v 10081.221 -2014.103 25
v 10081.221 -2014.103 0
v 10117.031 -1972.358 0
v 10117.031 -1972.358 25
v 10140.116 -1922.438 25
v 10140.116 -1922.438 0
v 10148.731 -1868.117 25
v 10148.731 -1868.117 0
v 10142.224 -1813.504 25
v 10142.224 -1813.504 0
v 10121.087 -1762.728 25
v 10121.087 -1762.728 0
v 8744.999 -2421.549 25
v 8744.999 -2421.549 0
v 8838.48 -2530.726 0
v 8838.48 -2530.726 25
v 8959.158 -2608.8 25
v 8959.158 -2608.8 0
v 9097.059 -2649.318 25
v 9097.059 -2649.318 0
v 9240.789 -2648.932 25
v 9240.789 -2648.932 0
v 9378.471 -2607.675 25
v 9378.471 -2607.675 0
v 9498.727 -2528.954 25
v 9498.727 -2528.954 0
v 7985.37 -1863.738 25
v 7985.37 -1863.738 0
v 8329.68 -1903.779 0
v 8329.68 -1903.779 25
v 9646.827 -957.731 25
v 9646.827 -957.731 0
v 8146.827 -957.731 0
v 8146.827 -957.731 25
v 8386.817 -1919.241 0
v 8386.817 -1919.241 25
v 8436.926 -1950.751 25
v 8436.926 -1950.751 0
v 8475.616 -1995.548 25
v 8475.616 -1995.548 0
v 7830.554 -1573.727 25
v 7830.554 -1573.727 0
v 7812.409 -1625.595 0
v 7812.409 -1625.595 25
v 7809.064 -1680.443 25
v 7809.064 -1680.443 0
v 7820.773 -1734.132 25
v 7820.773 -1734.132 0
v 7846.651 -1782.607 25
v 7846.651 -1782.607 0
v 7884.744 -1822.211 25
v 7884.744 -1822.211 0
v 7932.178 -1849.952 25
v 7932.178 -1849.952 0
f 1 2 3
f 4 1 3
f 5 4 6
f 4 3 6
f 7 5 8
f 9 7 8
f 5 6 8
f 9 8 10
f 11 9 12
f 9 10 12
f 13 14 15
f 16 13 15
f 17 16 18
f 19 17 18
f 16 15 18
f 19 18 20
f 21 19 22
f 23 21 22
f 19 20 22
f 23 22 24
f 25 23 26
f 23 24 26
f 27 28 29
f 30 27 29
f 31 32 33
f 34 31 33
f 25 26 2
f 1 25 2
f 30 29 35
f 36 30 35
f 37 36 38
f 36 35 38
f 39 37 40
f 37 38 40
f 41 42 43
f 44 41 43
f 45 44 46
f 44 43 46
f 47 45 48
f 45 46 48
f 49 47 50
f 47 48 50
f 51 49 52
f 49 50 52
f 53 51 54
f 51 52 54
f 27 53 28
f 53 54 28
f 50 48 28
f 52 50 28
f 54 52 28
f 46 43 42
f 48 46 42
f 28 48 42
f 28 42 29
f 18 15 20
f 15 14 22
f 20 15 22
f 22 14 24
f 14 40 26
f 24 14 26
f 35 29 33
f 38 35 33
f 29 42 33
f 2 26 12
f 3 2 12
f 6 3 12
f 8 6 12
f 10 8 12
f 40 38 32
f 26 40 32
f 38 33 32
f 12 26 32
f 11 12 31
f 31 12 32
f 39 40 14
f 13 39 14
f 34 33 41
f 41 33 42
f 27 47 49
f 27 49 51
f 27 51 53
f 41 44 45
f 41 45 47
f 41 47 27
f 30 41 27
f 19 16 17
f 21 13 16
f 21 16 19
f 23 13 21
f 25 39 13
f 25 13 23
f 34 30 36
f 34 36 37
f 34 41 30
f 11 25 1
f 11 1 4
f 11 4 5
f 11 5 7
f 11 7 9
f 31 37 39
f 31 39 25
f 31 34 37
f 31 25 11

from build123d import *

# Parameters (mm, degrees)
F1_DEPTH = 1
F2_DEPTH = 25


# Not quite as in the source:
# - a feature names something its author has since deleted; it is built from what else it names


with BuildPart() as f1:
    # F0 (on Top) → F1 (new body)
    with BuildSketch(Plane.XY):
        with BuildLine():
            Line((9646.8274642131, -957.7307995355), (8146.8274642131, -957.7307995355))
            Line((8146.8274642131, -957.7307995355), (7830.554096613, -1573.7270701518))
            ThreePointArc((7830.554096613, -1573.7270701518), (7832.0390367178, -1759.2626053639), (7985.3704990637, -1863.7379734104))
            Line((7985.3704990637, -1863.7379734104), (8329.6804291381, -1903.7785528549))
            ThreePointArc((8329.6804291381, -1903.7785528549), (8413.0435068902, -1933.1322385833), (8475.616358081, -1995.5476204376))
            Line((8475.616358081, -1995.5476204376), (8744.9993562468, -2421.5486497246))
            ThreePointArc((8744.9993562468, -2421.5486497246), (9097.0590224145, -2649.3179001076), (9498.727349417, -2528.9543049258))
            Line((9498.727349417, -2528.9543049258), (10081.2209659321, -2014.102836222))
            ThreePointArc((10081.2209659321, -2014.102836222), (10146.2998029037, -1895.5752337571), (10121.0868255742, -1762.7281286256))
            Line((10121.0868255742, -1762.7281286256), (9646.8274642131, -957.7307995355))
        make_face()
    extrude(amount=F1_DEPTH)

    # F0 (on Top) → F2 (join)
    with BuildSketch(Plane.XY):
        with BuildLine():
            Line((9646.8274642131, -957.7307995355), (8146.8274642131, -957.7307995355))
            Line((8146.8274642131, -957.7307995355), (7830.554096613, -1573.7270701518))
            ThreePointArc((7830.554096613, -1573.7270701518), (7832.0390367178, -1759.2626053639), (7985.3704990637, -1863.7379734104))
            Line((7985.3704990637, -1863.7379734104), (8329.6804291381, -1903.7785528549))
            ThreePointArc((8329.6804291381, -1903.7785528549), (8413.0435068902, -1933.1322385833), (8475.616358081, -1995.5476204376))
            Line((8475.616358081, -1995.5476204376), (8744.9993562468, -2421.5486497246))
            ThreePointArc((8744.9993562468, -2421.5486497246), (9097.0590224145, -2649.3179001076), (9498.727349417, -2528.9543049258))
            Line((9498.727349417, -2528.9543049258), (10081.2209659321, -2014.102836222))
            ThreePointArc((10081.2209659321, -2014.102836222), (10146.2998029037, -1895.5752337571), (10121.0868255742, -1762.7281286256))
            Line((10121.0868255742, -1762.7281286256), (9646.8274642131, -957.7307995355))
        make_face()
    extrude(amount=F2_DEPTH)


solid = f1.part
